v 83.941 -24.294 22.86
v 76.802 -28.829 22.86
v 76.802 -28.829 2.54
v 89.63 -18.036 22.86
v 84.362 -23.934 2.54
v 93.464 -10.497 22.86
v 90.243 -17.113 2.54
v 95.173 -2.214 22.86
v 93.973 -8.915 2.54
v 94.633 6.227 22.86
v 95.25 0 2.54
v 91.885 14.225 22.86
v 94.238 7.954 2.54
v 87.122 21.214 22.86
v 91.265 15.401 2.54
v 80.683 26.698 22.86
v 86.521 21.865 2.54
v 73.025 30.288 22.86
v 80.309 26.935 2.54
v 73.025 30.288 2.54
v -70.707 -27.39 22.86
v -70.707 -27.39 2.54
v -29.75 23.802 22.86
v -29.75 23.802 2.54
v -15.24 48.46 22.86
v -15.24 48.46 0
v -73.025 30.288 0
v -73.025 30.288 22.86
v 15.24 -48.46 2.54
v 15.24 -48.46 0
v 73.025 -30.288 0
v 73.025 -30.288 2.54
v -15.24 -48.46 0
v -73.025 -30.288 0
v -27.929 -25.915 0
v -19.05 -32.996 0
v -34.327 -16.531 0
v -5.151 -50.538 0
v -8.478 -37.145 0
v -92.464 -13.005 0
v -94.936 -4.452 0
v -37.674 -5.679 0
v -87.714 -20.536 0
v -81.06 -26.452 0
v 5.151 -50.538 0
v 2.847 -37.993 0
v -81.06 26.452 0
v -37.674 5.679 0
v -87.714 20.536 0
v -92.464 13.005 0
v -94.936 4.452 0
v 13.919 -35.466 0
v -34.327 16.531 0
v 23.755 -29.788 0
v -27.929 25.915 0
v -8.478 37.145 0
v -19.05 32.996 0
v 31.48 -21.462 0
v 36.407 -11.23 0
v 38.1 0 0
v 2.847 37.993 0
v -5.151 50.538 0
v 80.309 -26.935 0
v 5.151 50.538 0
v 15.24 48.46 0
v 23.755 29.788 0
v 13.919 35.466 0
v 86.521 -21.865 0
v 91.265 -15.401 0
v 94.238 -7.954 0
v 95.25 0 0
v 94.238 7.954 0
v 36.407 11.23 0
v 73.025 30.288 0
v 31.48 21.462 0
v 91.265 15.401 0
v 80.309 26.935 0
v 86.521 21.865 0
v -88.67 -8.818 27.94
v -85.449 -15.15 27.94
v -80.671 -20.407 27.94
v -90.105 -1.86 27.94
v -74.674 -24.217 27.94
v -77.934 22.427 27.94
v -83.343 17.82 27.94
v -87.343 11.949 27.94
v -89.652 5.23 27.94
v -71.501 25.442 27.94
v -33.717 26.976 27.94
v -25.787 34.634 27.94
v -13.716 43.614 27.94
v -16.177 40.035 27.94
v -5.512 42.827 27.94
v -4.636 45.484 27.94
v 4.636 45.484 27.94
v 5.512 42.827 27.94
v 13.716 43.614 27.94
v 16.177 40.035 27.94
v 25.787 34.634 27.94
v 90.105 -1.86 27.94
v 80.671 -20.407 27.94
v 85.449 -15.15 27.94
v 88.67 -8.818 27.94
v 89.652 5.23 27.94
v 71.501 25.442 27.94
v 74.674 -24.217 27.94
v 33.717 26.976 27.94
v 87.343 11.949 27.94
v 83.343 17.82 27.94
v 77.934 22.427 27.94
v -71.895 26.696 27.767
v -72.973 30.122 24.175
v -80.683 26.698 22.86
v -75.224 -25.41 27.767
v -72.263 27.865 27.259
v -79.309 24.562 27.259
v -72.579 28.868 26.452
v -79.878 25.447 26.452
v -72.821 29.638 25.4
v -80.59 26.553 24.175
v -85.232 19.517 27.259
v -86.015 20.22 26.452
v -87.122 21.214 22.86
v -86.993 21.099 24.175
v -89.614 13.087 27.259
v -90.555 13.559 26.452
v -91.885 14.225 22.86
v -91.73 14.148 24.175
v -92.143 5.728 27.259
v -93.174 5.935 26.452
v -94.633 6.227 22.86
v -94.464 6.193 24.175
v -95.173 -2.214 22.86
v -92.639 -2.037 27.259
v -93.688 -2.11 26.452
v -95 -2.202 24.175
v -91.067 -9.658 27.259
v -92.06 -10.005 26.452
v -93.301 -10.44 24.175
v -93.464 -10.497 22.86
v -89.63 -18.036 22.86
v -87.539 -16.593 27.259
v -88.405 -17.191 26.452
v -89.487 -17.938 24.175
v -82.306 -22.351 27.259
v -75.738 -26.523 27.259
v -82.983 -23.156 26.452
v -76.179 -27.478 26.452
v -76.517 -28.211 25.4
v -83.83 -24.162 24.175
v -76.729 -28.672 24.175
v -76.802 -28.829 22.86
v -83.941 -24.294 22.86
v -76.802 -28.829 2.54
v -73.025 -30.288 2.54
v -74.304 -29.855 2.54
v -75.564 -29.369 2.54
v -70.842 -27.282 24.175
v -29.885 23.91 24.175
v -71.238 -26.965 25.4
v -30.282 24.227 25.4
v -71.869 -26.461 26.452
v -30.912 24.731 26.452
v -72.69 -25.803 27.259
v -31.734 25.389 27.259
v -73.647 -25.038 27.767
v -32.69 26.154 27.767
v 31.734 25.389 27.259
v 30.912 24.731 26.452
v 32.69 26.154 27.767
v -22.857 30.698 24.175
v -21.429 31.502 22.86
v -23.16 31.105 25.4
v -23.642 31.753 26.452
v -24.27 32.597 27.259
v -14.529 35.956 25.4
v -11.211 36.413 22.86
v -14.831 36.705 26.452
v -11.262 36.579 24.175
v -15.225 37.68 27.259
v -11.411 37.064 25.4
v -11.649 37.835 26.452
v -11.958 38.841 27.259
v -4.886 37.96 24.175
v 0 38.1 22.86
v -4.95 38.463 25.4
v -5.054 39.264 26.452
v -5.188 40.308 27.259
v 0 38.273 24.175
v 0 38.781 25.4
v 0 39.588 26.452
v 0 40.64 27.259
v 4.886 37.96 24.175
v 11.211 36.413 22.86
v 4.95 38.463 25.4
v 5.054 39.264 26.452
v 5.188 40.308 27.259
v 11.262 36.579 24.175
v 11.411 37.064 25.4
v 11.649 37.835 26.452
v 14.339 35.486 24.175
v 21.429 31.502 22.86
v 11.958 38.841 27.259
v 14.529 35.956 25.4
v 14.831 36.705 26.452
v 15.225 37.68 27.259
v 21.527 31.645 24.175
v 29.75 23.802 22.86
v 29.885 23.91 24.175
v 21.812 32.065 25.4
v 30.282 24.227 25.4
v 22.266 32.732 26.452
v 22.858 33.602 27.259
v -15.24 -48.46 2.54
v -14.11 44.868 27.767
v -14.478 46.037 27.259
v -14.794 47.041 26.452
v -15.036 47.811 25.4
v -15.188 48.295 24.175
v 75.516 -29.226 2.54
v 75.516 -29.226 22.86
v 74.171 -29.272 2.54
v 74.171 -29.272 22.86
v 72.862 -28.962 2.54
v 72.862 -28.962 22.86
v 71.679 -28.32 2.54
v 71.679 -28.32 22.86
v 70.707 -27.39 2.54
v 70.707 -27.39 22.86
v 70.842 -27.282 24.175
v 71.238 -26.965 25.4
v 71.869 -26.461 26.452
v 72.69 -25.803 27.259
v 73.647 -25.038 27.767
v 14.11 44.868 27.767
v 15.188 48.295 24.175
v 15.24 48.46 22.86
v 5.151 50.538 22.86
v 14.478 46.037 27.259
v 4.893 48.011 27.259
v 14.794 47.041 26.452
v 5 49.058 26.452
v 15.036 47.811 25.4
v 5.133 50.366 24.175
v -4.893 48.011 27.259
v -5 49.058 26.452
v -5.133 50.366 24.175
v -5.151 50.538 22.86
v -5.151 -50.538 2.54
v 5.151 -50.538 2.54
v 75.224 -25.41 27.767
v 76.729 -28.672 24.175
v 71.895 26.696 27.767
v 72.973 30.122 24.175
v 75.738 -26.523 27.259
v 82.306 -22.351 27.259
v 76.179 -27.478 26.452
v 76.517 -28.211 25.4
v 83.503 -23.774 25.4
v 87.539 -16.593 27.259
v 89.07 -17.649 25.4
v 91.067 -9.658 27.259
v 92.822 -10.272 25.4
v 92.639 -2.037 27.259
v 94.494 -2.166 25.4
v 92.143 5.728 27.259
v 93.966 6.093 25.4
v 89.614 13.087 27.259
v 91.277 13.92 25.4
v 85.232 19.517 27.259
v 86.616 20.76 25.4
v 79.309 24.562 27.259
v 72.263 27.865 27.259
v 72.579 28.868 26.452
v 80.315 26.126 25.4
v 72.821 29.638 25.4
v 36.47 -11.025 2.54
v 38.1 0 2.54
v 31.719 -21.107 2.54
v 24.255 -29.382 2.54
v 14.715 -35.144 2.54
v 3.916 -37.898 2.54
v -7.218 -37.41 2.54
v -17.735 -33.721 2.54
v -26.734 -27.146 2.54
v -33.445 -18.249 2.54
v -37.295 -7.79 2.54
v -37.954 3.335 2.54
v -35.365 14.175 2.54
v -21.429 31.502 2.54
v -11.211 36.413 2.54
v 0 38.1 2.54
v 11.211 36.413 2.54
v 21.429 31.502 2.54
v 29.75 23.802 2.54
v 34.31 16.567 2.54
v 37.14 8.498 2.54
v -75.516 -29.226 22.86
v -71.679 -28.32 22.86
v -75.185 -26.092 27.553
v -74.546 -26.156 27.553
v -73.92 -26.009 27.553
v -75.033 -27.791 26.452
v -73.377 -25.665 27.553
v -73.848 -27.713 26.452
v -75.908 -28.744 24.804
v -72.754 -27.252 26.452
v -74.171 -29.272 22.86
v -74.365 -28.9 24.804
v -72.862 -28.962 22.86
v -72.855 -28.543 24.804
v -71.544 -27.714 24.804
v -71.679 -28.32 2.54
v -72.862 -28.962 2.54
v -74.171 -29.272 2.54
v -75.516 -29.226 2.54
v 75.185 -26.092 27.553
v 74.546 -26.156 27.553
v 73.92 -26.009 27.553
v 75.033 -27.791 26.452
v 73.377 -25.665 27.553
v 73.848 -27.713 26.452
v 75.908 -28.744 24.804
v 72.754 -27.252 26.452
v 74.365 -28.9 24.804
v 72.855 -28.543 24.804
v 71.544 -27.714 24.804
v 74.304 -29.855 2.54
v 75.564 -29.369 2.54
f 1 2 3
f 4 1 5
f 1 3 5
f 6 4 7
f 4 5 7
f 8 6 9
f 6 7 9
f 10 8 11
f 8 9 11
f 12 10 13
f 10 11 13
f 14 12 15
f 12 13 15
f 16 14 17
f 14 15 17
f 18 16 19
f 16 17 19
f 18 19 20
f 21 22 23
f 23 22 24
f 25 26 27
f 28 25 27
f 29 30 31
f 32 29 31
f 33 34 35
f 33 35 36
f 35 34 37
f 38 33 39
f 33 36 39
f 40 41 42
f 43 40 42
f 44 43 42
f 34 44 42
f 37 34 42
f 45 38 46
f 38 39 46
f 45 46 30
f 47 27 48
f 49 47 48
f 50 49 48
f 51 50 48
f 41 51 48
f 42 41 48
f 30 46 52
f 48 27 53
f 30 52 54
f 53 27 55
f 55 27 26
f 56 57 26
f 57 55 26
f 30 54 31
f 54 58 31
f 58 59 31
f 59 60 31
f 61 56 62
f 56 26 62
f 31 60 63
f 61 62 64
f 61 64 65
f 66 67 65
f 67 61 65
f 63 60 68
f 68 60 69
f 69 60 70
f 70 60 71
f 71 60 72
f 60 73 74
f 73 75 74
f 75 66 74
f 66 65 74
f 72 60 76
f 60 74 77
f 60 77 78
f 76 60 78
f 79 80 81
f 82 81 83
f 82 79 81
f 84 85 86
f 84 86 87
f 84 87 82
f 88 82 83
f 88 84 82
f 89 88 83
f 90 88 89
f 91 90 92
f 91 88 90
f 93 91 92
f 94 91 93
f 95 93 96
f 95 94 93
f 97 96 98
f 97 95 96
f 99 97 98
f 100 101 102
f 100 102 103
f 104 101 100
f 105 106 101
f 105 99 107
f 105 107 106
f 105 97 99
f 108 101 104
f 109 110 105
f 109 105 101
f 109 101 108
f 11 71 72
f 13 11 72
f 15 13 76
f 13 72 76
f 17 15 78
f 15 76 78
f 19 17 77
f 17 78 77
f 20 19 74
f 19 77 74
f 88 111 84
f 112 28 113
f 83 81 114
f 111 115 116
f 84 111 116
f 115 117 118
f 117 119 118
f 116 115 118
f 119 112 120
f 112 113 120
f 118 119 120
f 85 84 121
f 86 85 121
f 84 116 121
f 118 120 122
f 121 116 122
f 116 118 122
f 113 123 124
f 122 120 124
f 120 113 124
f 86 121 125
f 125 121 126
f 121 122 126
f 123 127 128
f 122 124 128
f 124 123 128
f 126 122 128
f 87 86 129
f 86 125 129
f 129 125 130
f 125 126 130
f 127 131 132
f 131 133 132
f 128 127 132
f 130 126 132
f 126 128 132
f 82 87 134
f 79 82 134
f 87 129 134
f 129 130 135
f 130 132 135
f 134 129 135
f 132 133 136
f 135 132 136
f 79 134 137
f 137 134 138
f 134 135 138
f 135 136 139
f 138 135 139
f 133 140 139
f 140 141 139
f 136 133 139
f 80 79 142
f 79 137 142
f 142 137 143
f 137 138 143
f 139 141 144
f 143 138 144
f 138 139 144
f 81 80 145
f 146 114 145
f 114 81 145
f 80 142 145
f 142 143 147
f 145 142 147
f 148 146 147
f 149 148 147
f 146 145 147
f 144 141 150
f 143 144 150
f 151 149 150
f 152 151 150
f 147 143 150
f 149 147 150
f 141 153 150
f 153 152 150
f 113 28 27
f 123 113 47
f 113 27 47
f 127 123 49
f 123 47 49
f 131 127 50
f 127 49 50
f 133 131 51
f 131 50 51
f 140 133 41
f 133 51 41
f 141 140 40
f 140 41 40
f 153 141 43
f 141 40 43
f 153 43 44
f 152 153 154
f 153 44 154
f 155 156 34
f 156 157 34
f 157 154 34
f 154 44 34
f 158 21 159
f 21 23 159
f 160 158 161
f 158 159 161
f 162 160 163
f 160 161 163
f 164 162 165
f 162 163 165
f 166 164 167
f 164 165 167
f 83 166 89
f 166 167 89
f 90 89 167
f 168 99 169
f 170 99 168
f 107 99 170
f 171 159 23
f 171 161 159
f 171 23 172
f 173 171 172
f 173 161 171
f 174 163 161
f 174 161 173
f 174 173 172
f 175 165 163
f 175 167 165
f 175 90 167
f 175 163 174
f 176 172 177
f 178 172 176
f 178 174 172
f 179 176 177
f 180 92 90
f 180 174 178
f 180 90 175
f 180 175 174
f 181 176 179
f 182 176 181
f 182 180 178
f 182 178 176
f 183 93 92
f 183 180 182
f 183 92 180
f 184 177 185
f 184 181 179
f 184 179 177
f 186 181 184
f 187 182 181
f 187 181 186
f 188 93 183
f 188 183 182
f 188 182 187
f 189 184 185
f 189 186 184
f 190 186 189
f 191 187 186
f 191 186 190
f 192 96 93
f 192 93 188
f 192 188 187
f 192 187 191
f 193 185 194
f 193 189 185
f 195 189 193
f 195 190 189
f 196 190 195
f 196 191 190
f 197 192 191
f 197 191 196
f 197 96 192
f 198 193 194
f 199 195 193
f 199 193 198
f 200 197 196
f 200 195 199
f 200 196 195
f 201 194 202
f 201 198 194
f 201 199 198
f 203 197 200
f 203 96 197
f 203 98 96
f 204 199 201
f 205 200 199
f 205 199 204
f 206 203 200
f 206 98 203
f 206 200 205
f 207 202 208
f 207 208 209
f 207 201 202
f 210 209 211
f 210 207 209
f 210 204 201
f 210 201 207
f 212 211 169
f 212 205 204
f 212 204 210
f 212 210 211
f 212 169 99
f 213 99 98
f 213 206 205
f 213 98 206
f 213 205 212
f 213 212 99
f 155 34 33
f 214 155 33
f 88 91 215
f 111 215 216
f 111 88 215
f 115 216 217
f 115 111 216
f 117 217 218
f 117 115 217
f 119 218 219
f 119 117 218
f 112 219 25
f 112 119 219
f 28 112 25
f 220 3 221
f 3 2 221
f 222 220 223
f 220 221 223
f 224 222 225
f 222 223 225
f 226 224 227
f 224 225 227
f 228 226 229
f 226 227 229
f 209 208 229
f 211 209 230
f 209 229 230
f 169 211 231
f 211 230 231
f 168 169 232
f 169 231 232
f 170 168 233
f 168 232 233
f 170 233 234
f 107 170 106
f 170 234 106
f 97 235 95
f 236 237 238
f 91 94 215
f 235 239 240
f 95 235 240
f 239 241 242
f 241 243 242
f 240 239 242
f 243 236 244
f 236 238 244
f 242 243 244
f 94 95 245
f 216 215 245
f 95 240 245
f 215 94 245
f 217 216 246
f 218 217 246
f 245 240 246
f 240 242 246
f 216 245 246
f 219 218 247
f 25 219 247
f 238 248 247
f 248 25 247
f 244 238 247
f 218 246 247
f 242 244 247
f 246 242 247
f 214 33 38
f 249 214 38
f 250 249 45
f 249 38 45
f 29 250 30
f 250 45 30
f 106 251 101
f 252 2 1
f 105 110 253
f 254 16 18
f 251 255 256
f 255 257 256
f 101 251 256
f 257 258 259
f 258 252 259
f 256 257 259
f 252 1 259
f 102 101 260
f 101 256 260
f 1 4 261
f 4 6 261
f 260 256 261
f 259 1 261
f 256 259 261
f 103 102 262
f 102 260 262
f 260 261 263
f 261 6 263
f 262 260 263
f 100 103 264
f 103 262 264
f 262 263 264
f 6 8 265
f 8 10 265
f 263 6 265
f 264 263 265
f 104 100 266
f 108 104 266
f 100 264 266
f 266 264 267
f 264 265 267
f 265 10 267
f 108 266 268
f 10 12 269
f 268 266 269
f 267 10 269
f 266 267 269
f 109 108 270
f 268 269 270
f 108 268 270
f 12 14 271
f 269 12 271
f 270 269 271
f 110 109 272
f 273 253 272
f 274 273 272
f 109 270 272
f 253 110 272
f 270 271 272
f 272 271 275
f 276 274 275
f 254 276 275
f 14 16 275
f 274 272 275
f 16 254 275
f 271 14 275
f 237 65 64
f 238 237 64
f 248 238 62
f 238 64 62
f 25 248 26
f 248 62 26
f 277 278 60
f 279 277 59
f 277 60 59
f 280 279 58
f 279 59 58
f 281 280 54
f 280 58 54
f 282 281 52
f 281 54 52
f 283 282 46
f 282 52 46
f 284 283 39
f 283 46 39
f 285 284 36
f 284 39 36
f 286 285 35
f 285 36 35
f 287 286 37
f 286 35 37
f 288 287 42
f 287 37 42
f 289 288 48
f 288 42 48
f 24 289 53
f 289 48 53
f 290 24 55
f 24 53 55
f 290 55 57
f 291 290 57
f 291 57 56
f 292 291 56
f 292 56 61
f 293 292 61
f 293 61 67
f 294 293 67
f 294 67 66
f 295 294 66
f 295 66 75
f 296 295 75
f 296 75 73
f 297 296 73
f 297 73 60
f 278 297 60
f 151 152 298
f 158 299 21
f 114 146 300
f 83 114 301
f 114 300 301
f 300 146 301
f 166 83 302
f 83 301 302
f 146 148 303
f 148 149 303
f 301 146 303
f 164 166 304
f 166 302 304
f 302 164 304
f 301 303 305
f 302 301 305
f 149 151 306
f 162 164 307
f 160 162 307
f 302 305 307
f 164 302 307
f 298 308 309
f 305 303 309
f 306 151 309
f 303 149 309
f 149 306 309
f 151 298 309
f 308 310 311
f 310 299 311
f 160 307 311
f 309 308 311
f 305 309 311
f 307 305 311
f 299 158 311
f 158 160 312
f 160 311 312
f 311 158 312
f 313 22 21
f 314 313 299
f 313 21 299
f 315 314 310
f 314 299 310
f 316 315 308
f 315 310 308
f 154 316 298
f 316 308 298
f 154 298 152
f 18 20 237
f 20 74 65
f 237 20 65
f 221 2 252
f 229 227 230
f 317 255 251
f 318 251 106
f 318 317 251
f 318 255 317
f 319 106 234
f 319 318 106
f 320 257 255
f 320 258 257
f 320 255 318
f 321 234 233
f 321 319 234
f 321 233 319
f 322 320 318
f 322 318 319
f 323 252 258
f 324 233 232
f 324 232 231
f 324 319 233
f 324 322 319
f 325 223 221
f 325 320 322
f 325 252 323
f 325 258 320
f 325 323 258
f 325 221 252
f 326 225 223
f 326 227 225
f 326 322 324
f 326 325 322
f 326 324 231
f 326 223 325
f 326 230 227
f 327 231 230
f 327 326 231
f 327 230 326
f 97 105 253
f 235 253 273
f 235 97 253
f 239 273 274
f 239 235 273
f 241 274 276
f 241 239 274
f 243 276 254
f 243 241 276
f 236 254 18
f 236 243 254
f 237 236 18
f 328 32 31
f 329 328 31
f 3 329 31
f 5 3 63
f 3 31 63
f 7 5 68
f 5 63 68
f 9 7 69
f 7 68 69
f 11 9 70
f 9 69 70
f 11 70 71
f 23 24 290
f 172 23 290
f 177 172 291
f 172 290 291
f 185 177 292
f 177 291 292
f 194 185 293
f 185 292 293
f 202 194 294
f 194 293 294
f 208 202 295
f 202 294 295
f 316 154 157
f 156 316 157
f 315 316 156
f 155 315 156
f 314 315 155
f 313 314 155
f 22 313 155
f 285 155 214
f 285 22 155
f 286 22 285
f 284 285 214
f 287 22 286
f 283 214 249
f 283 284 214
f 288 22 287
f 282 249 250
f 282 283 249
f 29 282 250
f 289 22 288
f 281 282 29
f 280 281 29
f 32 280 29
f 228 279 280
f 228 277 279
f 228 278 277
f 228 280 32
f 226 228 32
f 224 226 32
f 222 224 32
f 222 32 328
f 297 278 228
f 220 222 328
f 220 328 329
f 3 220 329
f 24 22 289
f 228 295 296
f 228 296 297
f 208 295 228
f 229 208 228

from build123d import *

# Parameters (mm, degrees)
F0_DEPTH = 2.54
F1_R     = 38.1
F5_DEPTH = 2.541
F2_DEPTH = 25.4
F3_R     = 5.08


with BuildPart() as f0:
    # F4 (on Top) → F0 (new body)
    with BuildSketch(Plane.XY):
        with BuildLine():
            ThreePointArc((44.1325, 25.1587448763), (31.8906233853, 39.5427381462), (15.24, 48.460111432))
            ThreePointArc((15.24, 48.460111432), (0, 50.8), (-15.24, 48.460111432))
            ThreePointArc((-15.24, 48.460111432), (-31.8906233853, 39.5427381462), (-44.1325, 25.1587448763))
            ThreePointArc((-44.1325, 25.1587448763), (-35.0133309687, 14.0204203753), (-31.75, 0))
            Line((-31.75, 0), (31.75, 0))
            ThreePointArc((31.75, 0), (35.0133309687, 14.0204203753), (44.1325, 25.1587448763))
        make_face()
        with BuildLine():
            Line((73.025, 30.287569645), (15.24, 48.460111432))
            ThreePointArc((15.24, 48.460111432), (31.8906233853, 39.5427381462), (44.1325, 25.1587448763))
            ThreePointArc((44.1325, 25.1587448763), (57.9506836061, 31.2612793654), (73.025, 30.287569645))
        make_face()
        with BuildLine():
            ThreePointArc((-44.1325, 25.1587448763), (-31.8906233853, 39.5427381462), (-15.24, 48.460111432))
            Line((-15.24, 48.460111432), (-73.025, 30.287569645))
            ThreePointArc((-73.025, 30.287569645), (-57.9506836061, 31.2612793654), (-44.1325, 25.1587448763))
        make_face()
        with BuildLine():
            ThreePointArc((73.025, 30.287569645), (57.9506836061, 31.2612793654), (44.1325, 25.1587448763))
            ThreePointArc((44.1325, 25.1587448763), (49.1048419201, 13.0136274728), (50.8, 0))
            ThreePointArc((50.8, 0), (49.1048419201, -13.0136274728), (44.1325, -25.1587448763))
            ThreePointArc((44.1325, -25.1587448763), (57.9506836061, -31.2612793654), (73.025, -30.287569645))
            ThreePointArc((73.025, -30.287569645), (89.0976683508, -18.7835533113), (95.25, 0))
            ThreePointArc((95.25, 0), (89.0976683508, 18.7835533113), (73.025, 30.287569645))
        make_face()
        with BuildLine():
            ThreePointArc((-50.8, 0), (-49.1048419201, 13.0136274728), (-44.1325, 25.1587448763))
            ThreePointArc((-44.1325, 25.1587448763), (-57.9506836061, 31.2612793654), (-73.025, 30.287569645))
            ThreePointArc((-73.025, 30.287569645), (-95.25, 0), (-73.025, -30.287569645))
            ThreePointArc((-73.025, -30.287569645), (-57.9506836061, -31.2612793654), (-44.1325, -25.1587448763))
            ThreePointArc((-44.1325, -25.1587448763), (-49.1048419201, -13.0136274728), (-50.8, 0))
        make_face()
        with BuildLine():
            ThreePointArc((44.1325, -25.1587448763), (35.0133309687, -14.0204203753), (31.75, 0))
            Line((31.75, 0), (-31.75, 0))
            ThreePointArc((-31.75, 0), (-35.0133309687, -14.0204203753), (-44.1325, -25.1587448763))
            ThreePointArc((-44.1325, -25.1587448763), (-31.8906233853, -39.5427381462), (-15.24, -48.460111432))
            ThreePointArc((-15.24, -48.460111432), (0, -50.8), (15.24, -48.460111432))
            ThreePointArc((15.24, -48.460111432), (31.8906233853, -39.5427381462), (44.1325, -25.1587448763))
        make_face()
        with BuildLine():
            ThreePointArc((-44.1325, -25.1587448763), (-57.9506836061, -31.2612793654), (-73.025, -30.287569645))
            Line((-73.025, -30.287569645), (-15.24, -48.460111432))
            ThreePointArc((-15.24, -48.460111432), (-31.8906233853, -39.5427381462), (-44.1325, -25.1587448763))
        make_face()
        with BuildLine():
            ThreePointArc((73.025, -30.287569645), (57.9506836061, -31.2612793654), (44.1325, -25.1587448763))
            ThreePointArc((44.1325, -25.1587448763), (31.8906233853, -39.5427381462), (15.24, -48.460111432))
            Line((15.24, -48.460111432), (73.025, -30.287569645))
        make_face()
        with BuildLine():
            ThreePointArc((50.8, 0), (49.1048419201, 13.0136274728), (44.1325, 25.1587448763))
            ThreePointArc((44.1325, 25.1587448763), (35.0133309687, 14.0204203753), (31.75, 0))
            Line((31.75, 0), (50.8, 0))
        make_face()
        with BuildLine():
            ThreePointArc((44.1325, -25.1587448763), (49.1048419201, -13.0136274728), (50.8, 0))
            Line((50.8, 0), (31.75, 0))
            ThreePointArc((31.75, 0), (35.0133309687, -14.0204203753), (44.1325, -25.1587448763))
        make_face()
        with BuildLine():
            Line((-31.75, 0), (-50.8, 0))
            ThreePointArc((-50.8, 0), (-49.1048419201, -13.0136274728), (-44.1325, -25.1587448763))
            ThreePointArc((-44.1325, -25.1587448763), (-35.0133309687, -14.0204203753), (-31.75, 0))
        make_face()
        with BuildLine():
            ThreePointArc((-31.75, 0), (-35.0133309687, 14.0204203753), (-44.1325, 25.1587448763))
            ThreePointArc((-44.1325, 25.1587448763), (-49.1048419201, 13.0136274728), (-50.8, 0))
            Line((-50.8, 0), (-31.75, 0))
        make_face()
    extrude(amount=F0_DEPTH)

    # F1 (on face) → F5 (cut, through all)
    with BuildSketch(Plane.XY.offset(2.54)):
        Circle(F1_R)
    extrude(amount=-F5_DEPTH, mode=Mode.SUBTRACT)

    # F6 (on face) → F2 (join)
    with BuildSketch(Plane.XY.offset(2.54)):
        with BuildLine():
            Line((-73.025, -30.287569645), (-29.75025979, 23.8019335859))
            ThreePointArc((-29.75025979, 23.8019335859), (0, 38.1), (29.75025979, 23.8019335859))
            Line((29.75025979, 23.8019335859), (73.025, -30.287569645))
            ThreePointArc((73.025, -30.287569645), (95.25, 0), (73.025, 30.287569645))
            Line((73.025, 30.287569645), (15.24, 48.460111432))
            ThreePointArc((15.24, 48.460111432), (0, 50.8), (-15.24, 48.460111432))
            Line((-15.24, 48.460111432), (-73.025, 30.287569645))
            ThreePointArc((-73.025, 30.287569645), (-95.25, 0), (-73.025, -30.287569645))
        make_face()
    extrude(amount=F2_DEPTH)

    # F3
    f3_edges = [f0.edges().sort_by_distance(p)[0] for p in [
        (73.025, -30.28757, 15.24),
        (-73.025, -30.28757, 15.24),
        (-44.1325, 39.373841, 27.94),
        (-95.25, 0, 27.94),
        (-51.38763, -3.242818, 27.94),
        (0, 38.1, 27.94),
        (51.38763, -3.242818, 27.94),
        (95.25, 0, 27.94),
        (44.1325, 39.373841, 27.94),
        (0, 50.8, 27.94),
    ]]
    fillet(f3_edges, radius=F3_R)


solid = f0.part
